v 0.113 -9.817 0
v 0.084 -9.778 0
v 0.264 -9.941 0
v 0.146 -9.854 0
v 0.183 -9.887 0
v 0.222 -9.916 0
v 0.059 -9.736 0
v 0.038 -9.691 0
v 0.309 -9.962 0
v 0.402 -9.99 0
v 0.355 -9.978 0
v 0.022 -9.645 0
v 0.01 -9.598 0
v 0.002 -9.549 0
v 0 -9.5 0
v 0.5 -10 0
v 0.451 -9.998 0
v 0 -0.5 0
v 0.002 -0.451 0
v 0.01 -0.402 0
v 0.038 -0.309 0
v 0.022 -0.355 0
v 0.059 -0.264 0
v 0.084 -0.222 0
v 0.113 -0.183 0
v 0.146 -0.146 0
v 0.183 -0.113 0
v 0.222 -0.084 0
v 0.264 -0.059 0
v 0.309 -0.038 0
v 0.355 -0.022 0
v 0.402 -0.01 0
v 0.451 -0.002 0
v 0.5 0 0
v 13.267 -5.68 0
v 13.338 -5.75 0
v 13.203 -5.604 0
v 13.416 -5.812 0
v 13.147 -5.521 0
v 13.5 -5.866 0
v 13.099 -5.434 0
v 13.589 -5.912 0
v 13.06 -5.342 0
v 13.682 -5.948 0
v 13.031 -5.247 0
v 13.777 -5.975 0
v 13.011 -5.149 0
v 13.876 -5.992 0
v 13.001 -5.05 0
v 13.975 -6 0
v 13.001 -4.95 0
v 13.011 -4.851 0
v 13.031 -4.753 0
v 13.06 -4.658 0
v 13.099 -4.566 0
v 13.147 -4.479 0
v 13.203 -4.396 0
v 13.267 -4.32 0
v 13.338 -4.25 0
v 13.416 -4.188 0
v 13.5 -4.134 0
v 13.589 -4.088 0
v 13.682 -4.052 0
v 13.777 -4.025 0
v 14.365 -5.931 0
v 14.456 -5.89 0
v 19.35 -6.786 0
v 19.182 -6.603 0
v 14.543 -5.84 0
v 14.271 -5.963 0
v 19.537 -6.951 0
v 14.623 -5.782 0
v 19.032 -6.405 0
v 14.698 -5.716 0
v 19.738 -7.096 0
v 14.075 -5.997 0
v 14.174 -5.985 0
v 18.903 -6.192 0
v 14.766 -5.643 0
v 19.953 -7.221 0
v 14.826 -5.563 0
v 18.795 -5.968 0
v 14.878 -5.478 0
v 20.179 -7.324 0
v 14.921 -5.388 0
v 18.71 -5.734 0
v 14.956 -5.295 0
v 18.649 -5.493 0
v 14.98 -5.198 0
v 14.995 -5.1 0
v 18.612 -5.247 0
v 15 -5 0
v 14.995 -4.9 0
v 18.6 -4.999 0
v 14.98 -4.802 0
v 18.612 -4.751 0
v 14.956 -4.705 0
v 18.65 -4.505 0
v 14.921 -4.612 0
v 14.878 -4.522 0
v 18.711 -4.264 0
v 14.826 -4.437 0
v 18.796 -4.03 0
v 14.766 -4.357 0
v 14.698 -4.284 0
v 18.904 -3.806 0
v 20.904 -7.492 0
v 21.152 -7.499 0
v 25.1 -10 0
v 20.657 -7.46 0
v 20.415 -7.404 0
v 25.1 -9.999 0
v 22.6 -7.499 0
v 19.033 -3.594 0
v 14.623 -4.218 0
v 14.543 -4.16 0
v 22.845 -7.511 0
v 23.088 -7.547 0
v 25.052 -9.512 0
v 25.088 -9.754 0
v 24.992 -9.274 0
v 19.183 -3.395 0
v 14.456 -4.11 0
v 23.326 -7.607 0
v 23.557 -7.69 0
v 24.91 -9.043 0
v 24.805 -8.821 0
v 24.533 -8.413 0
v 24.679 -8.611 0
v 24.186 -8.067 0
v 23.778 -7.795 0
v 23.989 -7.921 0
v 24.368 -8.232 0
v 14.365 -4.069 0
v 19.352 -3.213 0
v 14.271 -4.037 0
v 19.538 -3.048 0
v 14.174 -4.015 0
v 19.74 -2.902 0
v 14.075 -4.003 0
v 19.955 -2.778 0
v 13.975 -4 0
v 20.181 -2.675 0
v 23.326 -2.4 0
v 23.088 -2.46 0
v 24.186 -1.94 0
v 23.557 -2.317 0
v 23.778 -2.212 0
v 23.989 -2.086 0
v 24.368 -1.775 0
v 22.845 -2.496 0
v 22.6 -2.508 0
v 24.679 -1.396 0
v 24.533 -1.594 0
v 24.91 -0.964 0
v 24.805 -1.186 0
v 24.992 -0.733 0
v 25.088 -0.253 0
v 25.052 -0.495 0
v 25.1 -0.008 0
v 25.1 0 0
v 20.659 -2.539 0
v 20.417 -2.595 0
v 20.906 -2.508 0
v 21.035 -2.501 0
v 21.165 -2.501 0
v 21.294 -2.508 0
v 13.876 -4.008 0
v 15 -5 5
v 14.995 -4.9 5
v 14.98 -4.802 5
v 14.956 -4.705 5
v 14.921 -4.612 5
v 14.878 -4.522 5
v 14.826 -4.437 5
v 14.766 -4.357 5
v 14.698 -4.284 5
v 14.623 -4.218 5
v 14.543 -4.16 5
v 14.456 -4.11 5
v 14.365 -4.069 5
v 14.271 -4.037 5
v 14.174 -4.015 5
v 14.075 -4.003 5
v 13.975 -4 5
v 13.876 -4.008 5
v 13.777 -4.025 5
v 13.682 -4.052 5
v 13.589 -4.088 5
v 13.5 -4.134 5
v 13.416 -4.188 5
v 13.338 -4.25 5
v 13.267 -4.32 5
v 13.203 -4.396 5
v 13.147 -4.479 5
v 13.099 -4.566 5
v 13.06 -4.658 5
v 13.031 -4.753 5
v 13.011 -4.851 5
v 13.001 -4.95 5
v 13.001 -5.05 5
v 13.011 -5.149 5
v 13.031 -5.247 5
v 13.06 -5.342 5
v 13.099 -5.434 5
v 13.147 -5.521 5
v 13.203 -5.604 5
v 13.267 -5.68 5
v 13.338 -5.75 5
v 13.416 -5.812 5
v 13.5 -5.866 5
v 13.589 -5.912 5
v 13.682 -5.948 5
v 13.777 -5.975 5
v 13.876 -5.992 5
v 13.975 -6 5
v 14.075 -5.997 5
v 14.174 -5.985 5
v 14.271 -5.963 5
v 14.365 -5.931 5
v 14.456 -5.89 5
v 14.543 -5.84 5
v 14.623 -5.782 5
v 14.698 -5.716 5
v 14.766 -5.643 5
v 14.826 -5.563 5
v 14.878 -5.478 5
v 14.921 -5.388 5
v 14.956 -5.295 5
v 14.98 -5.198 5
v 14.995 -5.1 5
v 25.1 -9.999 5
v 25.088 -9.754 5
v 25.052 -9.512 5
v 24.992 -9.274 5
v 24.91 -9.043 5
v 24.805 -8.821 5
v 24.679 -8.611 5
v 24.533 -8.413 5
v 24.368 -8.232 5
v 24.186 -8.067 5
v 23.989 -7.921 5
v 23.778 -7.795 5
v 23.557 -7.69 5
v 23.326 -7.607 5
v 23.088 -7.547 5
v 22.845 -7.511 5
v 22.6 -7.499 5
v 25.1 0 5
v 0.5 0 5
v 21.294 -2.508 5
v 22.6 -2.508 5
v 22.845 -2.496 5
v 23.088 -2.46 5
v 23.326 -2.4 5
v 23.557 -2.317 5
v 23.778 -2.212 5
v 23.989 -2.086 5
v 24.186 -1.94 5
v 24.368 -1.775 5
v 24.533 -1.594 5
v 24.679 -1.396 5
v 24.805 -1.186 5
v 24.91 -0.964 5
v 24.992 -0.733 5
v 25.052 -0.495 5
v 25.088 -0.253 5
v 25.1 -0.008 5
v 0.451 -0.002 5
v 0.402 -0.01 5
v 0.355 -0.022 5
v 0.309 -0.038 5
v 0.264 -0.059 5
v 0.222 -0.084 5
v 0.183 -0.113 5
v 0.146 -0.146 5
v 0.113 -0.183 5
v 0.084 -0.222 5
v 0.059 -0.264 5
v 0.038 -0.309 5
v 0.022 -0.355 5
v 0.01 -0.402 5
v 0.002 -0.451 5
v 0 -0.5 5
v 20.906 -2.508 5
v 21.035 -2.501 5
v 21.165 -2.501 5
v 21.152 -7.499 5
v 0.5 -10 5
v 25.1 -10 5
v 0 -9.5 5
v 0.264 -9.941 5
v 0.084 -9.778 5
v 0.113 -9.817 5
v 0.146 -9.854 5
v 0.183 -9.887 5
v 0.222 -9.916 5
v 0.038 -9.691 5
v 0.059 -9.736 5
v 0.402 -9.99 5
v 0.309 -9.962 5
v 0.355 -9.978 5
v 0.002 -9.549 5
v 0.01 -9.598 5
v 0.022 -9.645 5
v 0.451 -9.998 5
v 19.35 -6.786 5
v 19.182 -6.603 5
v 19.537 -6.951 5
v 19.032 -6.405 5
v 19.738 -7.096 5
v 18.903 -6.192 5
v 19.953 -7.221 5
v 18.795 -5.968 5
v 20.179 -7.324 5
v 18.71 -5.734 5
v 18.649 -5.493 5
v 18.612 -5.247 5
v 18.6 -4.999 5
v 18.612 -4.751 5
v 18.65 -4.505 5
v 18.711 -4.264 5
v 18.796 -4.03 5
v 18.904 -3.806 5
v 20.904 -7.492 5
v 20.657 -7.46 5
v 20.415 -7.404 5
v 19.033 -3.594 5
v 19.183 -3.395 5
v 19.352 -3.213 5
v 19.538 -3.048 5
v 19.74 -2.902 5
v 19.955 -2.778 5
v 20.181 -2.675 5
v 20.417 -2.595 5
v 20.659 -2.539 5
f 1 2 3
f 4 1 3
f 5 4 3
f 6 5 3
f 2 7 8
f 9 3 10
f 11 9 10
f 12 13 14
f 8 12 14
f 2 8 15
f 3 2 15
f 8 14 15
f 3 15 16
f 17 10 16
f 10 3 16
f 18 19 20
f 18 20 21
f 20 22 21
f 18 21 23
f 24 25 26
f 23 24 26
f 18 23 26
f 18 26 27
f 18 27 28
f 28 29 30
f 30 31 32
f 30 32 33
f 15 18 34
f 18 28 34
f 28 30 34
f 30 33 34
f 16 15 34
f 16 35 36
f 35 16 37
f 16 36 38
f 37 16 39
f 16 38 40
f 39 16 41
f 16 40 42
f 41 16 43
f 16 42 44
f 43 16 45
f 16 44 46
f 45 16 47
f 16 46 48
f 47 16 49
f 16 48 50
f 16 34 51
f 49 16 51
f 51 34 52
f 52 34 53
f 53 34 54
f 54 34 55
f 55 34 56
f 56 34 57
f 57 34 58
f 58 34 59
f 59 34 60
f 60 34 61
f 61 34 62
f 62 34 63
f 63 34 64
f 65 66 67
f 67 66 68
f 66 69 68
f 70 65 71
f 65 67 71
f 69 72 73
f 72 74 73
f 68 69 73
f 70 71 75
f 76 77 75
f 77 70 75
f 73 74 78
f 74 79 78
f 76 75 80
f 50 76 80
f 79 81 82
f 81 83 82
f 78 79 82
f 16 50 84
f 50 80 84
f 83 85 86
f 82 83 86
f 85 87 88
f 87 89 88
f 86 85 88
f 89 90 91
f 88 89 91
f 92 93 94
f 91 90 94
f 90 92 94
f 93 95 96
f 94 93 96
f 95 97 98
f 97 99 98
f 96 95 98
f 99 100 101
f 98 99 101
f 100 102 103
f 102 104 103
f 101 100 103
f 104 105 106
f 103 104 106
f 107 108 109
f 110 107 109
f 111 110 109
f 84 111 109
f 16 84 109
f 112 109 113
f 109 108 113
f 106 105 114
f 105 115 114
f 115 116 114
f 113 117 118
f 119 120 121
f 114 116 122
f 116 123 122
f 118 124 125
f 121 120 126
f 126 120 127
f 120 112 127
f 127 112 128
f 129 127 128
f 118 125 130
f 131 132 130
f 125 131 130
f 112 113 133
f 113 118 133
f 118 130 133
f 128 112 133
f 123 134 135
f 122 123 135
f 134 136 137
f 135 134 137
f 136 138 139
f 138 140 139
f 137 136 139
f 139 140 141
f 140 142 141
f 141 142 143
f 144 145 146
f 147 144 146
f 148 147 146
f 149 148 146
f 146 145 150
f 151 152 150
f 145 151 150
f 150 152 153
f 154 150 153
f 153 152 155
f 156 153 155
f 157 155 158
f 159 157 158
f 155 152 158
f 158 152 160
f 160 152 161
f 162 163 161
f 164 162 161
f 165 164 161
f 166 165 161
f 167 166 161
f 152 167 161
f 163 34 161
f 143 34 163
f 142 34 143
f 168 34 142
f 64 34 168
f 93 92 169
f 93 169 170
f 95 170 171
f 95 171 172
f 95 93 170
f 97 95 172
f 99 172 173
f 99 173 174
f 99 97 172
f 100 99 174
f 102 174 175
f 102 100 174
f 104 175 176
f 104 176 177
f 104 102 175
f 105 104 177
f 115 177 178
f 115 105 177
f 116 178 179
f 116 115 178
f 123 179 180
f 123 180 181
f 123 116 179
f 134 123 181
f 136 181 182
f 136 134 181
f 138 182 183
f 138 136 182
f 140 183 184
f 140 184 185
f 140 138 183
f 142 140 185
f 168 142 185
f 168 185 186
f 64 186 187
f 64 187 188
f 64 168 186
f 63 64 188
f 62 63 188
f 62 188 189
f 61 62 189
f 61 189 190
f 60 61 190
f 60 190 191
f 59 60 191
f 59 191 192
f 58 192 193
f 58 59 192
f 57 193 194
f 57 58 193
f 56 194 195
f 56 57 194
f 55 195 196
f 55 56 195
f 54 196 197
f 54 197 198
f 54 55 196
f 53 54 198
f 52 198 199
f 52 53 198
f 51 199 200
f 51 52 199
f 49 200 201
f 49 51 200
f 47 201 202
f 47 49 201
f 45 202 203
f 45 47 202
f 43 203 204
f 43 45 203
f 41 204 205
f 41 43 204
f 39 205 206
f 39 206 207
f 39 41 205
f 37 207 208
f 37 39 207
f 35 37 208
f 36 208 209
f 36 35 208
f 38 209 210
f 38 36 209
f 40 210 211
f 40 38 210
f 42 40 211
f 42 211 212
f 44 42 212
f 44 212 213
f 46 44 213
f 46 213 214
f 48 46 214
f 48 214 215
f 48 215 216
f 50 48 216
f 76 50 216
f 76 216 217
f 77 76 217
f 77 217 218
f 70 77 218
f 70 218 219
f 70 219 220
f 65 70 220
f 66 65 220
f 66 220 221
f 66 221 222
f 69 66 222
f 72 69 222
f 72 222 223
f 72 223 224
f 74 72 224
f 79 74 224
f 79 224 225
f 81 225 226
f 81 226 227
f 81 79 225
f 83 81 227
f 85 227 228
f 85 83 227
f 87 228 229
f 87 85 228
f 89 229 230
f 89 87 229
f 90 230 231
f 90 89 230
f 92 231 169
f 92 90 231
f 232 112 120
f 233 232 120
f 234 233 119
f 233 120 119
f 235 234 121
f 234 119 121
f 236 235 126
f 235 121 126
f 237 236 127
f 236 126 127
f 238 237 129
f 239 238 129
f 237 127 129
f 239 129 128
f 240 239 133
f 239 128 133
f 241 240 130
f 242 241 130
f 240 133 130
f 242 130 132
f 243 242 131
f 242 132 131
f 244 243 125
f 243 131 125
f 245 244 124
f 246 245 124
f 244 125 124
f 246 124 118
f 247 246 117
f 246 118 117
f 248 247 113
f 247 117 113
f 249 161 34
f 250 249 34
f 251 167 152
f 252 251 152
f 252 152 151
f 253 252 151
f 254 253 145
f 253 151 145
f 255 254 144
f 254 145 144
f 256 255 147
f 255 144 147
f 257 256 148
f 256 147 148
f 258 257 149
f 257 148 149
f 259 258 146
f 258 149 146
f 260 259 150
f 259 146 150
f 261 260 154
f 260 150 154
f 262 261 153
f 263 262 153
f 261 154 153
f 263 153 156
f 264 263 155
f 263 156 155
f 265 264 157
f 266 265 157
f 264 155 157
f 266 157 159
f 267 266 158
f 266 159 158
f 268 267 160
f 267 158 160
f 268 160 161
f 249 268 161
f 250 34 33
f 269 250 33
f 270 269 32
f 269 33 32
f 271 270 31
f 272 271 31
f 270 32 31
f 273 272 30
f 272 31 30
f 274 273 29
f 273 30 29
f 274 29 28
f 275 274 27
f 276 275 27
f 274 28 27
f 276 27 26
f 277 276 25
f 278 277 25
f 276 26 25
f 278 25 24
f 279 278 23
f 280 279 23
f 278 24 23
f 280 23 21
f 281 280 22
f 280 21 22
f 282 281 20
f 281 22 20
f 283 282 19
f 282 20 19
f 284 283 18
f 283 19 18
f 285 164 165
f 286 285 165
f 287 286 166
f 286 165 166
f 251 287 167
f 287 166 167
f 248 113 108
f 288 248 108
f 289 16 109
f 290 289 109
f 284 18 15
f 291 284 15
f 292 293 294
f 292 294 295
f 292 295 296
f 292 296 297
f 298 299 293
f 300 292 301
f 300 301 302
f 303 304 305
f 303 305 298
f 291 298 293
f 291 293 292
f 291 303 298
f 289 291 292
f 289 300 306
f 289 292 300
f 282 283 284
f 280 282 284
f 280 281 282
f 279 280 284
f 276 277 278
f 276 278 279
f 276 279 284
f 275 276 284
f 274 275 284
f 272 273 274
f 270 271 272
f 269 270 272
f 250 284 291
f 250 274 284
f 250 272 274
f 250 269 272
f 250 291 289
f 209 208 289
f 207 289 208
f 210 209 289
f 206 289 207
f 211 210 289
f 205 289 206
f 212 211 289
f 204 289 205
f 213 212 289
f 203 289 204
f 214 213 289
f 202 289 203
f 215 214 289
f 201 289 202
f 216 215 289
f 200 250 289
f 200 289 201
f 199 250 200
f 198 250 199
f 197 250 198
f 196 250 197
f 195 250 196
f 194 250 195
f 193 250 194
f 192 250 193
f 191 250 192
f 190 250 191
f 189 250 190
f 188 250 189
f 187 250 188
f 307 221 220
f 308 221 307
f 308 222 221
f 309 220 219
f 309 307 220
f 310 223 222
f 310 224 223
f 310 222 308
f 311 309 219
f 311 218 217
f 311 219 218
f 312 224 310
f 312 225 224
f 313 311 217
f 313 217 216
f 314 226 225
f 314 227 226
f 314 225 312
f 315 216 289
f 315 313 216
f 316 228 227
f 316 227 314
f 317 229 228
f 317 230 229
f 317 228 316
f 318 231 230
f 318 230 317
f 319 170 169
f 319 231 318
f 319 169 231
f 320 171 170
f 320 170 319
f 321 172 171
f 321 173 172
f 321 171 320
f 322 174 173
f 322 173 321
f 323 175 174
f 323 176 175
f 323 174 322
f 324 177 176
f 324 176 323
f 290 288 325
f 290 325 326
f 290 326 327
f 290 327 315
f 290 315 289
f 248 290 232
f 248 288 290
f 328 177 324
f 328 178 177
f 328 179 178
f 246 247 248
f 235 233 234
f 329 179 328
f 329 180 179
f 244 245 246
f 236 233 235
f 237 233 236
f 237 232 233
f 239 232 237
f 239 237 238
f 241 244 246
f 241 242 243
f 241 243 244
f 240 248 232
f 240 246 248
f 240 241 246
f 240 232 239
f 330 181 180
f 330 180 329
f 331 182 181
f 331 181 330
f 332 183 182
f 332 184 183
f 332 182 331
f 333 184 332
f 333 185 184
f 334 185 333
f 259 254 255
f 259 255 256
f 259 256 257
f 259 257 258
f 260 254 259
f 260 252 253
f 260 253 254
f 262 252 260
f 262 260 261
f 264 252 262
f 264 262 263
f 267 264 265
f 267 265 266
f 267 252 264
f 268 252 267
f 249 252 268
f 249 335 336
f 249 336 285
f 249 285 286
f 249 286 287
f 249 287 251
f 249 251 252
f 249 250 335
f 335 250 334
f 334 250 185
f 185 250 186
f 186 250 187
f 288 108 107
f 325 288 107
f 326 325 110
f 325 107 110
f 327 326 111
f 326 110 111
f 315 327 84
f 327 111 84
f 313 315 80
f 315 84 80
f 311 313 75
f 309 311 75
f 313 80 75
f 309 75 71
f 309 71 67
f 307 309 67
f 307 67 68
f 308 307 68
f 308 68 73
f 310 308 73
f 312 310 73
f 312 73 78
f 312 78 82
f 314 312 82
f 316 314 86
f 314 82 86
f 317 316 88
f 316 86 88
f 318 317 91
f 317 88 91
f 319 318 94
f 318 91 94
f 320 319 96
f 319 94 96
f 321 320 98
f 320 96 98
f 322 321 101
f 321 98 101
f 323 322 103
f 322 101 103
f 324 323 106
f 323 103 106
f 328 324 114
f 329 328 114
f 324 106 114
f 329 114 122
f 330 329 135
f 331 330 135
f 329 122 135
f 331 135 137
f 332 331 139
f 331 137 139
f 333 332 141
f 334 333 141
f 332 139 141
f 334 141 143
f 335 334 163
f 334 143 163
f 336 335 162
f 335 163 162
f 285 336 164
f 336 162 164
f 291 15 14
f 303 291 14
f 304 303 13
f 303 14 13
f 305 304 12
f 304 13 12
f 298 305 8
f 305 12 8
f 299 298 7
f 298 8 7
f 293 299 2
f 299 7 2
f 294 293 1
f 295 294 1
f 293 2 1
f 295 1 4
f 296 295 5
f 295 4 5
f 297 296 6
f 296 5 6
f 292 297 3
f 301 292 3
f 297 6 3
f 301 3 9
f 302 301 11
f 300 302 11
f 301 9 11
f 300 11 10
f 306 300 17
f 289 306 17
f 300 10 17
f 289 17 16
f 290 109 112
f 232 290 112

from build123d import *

# Parameters (mm, degrees)
F0_R     = 1
F1_DEPTH = 5


with BuildPart() as f1:
    # F0 (on Top) → F1 (new body)
    with BuildSketch(Plane.XY):
        with BuildLine():
            Line((25.1, 0), (0.5, 0))
            ThreePointArc((0.5, 0), (0.146447, -0.146447), (0, -0.5))
            Line((0, -0.5), (0, -9.5))
            ThreePointArc((0, -9.5), (0.146447, -9.853553), (0.5, -10))
            Line((0.5, -10), (25.1, -10))
            Line((25.1, -10), (25.1, -9.999452))
            ThreePointArc((25.1, -9.999452), (24.367767, -8.231685), (22.6, -7.499452))
            Line((22.6, -7.499452), (21.152357, -7.499452))
            ThreePointArc((21.152357, -7.499452), (18.603039, -5.123229), (20.905998, -2.507539))
            ThreePointArc((20.905998, -2.507539), (21.1, -2.5), (21.294002, -2.507539))
            Line((21.294002, -2.507539), (22.6, -2.507539))
            ThreePointArc((22.6, -2.507539), (24.367767, -1.775306), (25.1, -0.007539))
            Line((25.1, -0.007539), (25.1, 0))
        make_face()
        with Locations((14, -5)):
            Circle(F0_R, mode=Mode.SUBTRACT)
    extrude(amount=F1_DEPTH)


solid = f1.part
